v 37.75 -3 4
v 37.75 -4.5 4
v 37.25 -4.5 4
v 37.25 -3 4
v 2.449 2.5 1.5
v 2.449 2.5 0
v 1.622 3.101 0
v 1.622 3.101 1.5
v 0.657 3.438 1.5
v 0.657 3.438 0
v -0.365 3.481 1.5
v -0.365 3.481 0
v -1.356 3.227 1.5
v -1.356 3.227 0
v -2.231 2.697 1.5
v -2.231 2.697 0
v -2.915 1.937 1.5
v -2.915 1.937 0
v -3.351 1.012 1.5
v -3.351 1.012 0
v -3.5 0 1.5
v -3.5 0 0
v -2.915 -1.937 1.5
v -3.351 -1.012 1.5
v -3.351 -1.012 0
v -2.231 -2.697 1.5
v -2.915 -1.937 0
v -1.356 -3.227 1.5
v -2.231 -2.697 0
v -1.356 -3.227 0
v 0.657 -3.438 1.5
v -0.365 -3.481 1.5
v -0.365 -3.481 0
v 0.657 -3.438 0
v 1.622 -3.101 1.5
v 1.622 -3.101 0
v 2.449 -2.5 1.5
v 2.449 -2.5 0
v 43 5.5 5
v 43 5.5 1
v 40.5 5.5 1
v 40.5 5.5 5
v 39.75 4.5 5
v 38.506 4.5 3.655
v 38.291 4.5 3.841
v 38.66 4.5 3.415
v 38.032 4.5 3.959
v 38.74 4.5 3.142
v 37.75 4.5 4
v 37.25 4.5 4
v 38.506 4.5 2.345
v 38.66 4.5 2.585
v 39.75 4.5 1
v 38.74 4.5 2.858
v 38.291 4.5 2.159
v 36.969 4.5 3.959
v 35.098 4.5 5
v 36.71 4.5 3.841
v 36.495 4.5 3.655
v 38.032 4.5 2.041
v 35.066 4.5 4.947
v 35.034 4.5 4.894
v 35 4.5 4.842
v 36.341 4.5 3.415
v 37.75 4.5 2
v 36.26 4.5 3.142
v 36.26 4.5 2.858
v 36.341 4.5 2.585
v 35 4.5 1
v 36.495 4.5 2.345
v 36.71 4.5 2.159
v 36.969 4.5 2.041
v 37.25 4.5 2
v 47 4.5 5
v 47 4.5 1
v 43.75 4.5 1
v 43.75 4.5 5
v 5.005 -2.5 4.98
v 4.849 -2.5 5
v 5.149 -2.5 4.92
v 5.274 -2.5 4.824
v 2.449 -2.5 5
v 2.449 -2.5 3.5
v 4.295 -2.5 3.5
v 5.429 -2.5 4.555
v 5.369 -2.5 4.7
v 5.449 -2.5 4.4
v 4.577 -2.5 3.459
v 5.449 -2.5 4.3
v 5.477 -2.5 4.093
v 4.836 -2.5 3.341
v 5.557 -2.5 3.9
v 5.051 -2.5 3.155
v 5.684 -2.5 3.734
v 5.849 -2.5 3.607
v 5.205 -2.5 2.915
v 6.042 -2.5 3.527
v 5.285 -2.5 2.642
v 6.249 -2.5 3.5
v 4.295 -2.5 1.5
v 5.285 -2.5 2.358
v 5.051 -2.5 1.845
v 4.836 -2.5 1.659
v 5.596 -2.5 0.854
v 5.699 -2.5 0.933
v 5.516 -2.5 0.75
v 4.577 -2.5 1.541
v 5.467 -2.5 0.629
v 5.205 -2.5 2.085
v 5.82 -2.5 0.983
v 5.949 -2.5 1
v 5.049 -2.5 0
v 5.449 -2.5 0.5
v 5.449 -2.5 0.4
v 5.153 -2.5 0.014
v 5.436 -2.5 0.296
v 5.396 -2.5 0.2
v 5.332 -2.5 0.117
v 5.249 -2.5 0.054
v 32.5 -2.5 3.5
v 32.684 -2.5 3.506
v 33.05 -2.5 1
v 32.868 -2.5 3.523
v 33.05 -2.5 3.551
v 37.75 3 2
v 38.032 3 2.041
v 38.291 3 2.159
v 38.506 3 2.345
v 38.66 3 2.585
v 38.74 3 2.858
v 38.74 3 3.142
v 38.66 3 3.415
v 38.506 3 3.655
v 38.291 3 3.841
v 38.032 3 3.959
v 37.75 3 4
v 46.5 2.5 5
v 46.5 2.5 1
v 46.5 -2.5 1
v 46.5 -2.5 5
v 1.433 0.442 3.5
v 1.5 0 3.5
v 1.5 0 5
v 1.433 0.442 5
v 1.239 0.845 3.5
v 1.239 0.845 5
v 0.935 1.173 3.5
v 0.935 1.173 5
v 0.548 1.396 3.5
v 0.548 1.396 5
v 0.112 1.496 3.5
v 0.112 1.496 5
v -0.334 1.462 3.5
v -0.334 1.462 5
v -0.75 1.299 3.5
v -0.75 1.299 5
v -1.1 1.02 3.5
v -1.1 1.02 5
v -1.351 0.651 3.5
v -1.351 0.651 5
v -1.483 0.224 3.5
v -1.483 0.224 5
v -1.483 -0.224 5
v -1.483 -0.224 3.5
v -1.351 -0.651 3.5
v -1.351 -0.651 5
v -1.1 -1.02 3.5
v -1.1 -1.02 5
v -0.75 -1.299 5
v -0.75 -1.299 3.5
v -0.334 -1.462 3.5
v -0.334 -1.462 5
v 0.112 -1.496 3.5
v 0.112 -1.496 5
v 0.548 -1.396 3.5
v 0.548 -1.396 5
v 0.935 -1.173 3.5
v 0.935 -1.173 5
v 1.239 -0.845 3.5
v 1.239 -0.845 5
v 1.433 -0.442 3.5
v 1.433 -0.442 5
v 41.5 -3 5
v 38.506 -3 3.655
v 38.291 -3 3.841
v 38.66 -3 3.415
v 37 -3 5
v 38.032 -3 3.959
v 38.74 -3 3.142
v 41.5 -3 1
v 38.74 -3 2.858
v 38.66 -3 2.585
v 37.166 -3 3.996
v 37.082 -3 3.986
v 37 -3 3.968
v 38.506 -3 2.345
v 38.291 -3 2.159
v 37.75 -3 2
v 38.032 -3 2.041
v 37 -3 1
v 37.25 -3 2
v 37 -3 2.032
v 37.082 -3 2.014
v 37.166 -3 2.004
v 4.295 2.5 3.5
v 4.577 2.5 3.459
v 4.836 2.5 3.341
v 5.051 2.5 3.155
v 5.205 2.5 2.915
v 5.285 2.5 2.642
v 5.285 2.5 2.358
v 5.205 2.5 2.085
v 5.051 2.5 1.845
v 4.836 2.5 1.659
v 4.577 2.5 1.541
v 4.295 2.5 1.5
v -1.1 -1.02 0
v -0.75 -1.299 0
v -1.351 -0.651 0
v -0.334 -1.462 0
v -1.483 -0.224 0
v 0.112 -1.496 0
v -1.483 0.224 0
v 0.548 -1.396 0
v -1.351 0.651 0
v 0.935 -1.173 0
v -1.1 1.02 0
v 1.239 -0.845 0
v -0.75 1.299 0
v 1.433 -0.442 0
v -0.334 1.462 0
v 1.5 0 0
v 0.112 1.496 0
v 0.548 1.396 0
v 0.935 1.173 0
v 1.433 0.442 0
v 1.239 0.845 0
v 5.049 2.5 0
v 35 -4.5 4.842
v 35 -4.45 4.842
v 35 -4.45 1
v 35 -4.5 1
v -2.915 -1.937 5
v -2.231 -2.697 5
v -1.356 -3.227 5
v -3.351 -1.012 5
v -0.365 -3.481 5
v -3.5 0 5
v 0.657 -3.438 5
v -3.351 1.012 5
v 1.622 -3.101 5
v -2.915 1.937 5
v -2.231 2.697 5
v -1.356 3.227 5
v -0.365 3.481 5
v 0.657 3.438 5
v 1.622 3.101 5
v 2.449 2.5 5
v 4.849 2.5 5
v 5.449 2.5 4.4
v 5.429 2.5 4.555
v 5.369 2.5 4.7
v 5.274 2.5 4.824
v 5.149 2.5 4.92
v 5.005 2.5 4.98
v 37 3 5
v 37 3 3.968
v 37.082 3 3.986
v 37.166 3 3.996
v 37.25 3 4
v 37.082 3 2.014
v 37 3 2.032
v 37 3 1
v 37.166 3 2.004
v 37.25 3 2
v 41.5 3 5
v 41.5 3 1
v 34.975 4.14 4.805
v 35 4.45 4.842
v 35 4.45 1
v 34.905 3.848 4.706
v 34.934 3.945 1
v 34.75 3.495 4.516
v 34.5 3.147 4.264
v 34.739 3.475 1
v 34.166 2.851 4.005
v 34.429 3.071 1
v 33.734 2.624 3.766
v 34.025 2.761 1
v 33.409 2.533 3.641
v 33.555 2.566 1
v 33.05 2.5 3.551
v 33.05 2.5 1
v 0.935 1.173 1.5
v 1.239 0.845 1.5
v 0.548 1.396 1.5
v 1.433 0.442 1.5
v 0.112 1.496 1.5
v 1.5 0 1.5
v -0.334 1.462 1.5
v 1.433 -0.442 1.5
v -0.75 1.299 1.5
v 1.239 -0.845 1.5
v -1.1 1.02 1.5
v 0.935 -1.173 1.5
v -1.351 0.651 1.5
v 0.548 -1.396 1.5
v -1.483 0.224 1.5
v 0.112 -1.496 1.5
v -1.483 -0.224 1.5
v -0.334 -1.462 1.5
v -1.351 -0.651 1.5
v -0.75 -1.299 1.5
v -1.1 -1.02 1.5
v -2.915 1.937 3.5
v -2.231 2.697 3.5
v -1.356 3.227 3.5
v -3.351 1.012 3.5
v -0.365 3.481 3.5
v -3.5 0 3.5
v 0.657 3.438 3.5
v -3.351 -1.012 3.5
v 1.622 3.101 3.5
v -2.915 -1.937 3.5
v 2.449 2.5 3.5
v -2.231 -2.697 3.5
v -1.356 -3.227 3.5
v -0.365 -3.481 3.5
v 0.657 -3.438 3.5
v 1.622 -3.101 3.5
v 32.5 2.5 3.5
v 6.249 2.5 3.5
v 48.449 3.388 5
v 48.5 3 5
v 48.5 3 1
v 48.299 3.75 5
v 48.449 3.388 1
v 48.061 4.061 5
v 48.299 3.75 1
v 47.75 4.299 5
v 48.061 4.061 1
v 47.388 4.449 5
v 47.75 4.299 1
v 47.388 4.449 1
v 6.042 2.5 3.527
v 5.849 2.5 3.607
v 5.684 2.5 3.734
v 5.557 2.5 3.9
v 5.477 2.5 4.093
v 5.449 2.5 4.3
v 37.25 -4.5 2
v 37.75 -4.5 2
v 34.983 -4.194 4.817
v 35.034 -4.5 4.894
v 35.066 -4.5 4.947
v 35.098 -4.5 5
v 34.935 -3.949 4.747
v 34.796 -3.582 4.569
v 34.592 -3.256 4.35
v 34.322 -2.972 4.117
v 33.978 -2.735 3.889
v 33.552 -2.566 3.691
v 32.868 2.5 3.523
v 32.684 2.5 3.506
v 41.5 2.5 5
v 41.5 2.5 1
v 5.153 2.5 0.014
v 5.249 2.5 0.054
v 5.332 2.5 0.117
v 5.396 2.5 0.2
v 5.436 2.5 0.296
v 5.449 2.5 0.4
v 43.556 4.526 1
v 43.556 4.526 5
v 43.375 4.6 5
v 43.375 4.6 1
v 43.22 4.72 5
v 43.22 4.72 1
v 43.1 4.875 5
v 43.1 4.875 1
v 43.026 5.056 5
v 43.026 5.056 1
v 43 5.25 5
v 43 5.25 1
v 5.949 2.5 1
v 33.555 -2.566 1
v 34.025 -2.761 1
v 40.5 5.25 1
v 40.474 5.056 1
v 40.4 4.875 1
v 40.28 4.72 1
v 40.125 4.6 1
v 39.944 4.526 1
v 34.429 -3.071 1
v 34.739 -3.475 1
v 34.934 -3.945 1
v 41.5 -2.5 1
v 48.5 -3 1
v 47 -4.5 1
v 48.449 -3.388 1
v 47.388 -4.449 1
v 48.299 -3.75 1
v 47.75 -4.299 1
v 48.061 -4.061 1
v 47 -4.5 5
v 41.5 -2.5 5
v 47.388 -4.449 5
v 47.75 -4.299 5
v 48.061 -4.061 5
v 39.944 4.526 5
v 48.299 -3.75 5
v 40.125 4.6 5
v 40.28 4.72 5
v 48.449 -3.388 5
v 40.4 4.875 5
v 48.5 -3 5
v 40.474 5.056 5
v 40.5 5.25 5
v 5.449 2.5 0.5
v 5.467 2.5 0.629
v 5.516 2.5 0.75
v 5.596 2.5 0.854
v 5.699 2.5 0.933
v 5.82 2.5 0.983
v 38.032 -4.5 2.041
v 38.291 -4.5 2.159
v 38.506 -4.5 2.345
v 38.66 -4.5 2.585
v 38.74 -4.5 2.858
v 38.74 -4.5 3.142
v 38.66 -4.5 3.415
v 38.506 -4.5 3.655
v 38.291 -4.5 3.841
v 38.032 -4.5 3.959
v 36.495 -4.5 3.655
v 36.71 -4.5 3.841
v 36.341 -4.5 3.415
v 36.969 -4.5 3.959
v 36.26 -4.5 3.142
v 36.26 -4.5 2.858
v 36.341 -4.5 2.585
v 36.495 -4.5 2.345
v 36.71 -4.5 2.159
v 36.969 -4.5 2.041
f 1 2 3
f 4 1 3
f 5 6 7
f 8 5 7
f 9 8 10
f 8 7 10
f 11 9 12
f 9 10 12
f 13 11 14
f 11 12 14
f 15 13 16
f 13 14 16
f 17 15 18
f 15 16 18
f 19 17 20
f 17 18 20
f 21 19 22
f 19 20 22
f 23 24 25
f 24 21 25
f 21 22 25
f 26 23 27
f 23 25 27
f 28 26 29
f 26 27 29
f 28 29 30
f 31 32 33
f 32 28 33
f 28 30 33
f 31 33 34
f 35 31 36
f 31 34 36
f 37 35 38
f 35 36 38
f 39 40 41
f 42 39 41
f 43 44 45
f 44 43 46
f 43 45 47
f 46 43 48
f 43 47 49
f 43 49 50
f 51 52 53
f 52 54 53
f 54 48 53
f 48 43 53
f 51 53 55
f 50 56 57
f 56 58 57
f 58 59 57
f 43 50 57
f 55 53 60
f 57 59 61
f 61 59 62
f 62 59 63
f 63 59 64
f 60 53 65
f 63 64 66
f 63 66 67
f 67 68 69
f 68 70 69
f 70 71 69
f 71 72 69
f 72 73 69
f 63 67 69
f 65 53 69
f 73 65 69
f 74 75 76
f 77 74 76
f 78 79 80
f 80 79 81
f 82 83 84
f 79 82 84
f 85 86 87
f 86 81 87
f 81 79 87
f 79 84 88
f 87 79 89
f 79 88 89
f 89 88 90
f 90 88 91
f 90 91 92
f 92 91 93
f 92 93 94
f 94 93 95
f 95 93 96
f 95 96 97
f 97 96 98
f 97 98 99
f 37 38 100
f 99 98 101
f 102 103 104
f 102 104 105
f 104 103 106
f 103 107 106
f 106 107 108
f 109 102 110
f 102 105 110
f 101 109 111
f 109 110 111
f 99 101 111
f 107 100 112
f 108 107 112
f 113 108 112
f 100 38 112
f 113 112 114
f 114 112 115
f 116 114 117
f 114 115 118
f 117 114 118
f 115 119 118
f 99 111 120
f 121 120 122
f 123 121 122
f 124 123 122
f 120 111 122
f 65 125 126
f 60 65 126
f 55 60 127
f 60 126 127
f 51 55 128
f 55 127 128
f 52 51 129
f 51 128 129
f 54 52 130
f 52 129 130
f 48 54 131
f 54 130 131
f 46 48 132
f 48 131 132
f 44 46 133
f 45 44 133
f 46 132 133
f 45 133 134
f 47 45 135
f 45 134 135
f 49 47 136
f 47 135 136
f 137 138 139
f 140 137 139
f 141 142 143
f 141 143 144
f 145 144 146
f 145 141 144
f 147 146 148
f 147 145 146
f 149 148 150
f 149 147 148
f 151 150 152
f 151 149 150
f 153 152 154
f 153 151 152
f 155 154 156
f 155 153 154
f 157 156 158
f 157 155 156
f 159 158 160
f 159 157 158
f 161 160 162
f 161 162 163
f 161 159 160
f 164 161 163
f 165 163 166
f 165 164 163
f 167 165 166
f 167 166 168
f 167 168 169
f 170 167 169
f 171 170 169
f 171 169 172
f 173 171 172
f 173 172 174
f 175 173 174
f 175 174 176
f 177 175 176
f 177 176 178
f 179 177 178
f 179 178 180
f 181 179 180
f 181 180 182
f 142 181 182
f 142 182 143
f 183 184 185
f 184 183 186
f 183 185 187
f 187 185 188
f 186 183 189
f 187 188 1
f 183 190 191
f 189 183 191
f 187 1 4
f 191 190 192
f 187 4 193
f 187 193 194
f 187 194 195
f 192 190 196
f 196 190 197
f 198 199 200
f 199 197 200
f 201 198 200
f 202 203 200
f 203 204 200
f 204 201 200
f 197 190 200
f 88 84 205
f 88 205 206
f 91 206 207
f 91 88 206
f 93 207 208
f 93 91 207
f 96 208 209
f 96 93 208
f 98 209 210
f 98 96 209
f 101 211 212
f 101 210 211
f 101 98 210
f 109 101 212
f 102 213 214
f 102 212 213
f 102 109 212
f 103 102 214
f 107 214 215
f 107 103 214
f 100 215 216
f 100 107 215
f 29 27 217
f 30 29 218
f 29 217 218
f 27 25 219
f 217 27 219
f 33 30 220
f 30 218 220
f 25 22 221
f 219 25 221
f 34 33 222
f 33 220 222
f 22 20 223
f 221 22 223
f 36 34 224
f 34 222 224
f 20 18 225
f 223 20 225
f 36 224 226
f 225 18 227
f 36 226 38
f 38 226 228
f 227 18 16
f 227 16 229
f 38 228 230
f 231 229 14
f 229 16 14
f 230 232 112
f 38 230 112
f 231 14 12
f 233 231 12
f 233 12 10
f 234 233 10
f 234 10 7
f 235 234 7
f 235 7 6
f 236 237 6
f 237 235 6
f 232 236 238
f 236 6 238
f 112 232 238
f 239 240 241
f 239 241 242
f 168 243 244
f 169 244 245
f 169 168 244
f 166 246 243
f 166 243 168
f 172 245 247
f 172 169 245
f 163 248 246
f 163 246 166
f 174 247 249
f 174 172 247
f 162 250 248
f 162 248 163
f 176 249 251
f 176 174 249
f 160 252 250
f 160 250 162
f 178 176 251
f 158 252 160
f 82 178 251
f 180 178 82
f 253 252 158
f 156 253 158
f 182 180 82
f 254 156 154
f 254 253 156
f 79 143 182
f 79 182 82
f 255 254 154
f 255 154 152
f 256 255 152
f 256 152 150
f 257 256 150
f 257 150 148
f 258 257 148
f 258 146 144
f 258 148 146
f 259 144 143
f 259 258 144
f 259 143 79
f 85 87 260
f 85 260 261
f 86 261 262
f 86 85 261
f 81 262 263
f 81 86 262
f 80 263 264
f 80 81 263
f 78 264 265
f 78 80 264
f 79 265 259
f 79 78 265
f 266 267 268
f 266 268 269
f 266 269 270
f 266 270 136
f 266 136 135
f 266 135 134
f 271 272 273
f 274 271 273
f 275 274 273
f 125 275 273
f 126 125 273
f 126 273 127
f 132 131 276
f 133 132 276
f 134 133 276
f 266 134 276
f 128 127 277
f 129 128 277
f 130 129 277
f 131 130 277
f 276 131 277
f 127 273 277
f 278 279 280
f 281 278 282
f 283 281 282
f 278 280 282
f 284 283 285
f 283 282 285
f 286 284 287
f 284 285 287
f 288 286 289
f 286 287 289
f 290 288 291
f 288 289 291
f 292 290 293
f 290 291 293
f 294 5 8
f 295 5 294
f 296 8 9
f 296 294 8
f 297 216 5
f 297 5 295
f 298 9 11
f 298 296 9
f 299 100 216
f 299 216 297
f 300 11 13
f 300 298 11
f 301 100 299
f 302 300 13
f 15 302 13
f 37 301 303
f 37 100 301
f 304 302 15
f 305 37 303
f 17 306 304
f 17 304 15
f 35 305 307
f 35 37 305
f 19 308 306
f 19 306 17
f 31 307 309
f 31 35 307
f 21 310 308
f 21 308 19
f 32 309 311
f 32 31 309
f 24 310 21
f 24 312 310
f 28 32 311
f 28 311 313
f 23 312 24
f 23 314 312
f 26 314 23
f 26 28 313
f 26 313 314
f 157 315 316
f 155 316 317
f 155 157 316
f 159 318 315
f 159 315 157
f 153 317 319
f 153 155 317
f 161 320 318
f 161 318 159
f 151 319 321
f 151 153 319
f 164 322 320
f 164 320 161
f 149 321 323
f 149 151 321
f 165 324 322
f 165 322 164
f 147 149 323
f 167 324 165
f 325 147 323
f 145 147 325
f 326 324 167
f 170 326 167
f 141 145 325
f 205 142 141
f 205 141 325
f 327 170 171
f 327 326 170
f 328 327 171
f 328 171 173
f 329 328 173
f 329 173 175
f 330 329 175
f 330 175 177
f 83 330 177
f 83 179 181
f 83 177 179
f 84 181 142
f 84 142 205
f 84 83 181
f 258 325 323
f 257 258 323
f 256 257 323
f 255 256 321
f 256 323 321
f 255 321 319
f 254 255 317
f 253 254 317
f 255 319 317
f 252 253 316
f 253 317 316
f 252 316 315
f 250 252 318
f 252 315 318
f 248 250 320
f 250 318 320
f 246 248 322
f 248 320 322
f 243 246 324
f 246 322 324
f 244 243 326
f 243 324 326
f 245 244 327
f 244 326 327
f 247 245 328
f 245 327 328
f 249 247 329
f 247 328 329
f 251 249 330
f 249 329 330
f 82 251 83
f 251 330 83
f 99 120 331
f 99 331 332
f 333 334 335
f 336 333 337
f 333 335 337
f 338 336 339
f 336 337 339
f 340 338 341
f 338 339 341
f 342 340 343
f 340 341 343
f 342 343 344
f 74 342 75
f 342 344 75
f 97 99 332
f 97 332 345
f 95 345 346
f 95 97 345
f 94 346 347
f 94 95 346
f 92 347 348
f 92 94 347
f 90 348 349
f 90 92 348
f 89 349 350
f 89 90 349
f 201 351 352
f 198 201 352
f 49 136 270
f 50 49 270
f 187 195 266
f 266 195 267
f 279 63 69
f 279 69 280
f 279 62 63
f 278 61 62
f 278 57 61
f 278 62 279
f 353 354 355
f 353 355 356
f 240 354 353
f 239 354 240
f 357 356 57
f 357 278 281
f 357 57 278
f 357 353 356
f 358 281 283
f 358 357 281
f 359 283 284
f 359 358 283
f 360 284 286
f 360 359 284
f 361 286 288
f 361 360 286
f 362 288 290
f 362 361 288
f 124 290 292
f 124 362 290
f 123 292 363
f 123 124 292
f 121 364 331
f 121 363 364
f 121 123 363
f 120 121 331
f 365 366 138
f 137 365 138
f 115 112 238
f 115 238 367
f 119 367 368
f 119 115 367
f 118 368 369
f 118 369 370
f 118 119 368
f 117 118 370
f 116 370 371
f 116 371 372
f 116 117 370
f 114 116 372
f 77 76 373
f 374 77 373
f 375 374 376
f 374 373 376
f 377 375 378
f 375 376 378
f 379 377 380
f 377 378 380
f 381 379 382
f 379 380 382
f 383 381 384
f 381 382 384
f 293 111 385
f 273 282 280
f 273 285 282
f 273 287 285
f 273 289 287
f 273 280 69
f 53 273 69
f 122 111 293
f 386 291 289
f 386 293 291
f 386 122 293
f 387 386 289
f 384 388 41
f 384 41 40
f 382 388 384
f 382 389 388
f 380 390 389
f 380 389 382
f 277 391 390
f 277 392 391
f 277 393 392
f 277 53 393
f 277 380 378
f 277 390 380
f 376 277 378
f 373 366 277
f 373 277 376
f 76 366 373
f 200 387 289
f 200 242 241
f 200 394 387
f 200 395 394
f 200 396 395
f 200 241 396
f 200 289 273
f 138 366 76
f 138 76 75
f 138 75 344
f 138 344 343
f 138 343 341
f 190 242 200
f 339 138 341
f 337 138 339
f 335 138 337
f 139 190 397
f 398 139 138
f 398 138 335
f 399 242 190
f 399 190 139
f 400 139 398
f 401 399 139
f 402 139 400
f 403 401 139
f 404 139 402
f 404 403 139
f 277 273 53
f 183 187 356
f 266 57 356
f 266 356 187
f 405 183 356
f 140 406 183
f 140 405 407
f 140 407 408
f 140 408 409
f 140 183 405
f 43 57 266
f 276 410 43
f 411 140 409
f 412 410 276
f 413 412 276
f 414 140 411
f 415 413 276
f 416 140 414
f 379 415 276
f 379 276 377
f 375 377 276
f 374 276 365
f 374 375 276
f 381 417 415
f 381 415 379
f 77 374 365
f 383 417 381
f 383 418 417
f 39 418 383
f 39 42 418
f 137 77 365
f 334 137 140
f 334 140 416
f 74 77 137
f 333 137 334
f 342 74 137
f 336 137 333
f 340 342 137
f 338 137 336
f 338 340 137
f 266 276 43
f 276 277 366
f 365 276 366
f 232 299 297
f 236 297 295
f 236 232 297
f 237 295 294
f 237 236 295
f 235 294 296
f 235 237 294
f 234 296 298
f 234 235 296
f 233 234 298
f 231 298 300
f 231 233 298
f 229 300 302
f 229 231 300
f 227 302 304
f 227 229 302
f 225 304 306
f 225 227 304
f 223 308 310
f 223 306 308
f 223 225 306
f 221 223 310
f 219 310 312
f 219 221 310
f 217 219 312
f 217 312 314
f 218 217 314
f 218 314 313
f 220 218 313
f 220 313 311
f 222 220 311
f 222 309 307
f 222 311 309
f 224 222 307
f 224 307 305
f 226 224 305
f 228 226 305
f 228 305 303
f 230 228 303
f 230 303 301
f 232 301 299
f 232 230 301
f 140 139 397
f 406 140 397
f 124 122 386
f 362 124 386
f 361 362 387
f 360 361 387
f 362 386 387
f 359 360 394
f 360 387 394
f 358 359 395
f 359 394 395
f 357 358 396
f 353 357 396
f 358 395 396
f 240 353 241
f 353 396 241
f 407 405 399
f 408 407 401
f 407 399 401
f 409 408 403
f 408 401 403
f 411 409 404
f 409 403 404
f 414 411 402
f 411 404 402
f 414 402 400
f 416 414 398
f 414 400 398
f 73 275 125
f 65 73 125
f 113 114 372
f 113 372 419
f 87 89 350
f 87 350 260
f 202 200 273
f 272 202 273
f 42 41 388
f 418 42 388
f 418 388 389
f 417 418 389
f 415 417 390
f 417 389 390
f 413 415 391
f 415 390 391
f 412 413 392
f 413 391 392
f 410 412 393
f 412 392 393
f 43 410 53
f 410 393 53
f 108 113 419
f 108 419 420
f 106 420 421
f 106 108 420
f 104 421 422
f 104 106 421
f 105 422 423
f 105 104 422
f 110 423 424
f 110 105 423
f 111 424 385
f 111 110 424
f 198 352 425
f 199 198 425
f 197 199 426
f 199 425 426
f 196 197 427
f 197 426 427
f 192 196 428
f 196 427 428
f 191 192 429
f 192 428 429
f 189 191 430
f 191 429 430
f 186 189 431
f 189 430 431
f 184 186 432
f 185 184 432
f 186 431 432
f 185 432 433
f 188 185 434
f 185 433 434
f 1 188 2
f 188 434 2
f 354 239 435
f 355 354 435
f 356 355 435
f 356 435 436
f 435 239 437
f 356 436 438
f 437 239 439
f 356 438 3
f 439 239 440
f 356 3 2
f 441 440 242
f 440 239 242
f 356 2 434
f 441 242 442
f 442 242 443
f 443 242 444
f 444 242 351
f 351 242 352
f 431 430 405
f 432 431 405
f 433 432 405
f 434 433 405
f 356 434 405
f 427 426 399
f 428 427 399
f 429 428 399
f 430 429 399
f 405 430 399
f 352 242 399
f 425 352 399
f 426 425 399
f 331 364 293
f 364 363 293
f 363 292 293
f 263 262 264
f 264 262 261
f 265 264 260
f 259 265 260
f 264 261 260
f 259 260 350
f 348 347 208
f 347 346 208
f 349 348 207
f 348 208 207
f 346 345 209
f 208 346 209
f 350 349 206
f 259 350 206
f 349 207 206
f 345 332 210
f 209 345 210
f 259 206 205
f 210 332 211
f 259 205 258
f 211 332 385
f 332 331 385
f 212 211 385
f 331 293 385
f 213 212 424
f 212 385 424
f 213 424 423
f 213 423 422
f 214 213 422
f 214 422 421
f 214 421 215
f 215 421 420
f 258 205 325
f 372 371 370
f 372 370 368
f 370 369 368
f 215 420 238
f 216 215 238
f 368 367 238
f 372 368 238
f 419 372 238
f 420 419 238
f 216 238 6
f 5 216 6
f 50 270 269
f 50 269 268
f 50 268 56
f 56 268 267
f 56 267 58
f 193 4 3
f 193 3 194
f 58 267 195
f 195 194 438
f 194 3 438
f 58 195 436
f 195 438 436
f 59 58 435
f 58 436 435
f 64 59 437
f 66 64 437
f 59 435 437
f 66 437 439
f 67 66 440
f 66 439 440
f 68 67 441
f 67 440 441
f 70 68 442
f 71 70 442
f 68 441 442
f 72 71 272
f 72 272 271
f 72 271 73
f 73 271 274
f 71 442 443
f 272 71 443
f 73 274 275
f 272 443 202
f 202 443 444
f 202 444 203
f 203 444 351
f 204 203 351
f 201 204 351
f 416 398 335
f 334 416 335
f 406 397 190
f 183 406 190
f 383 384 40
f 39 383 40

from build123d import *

# Parameters (mm, degrees)
ESQUISSE1_R                  = 3.5
ESQUISSE1_R_2                = 1.5
BOSS_EXTRU_1_DEPTH           = 5
ENL_V_MAT_EXTRU_2_DEPTH      = 50.256979201
ENL_V_MAT_EXTRU_2_DEPTH_BACK = 50.256979201
ENL_V_MAT_EXTRU_3_DEPTH      = 50.580742257
ENL_V_MAT_EXTRU_3_DEPTH_BACK = 50.580742257


with BuildPart() as part:
    # Esquisse1 → Boss.-Extru.1 (new body)
    # profile 1 of 2: a face of its own
    with BuildSketch(Plane.XY):
        Circle(ESQUISSE1_R)
        Circle(ESQUISSE1_R_2, mode=Mode.SUBTRACT)
    # profile 2 of 2: a face of its own
    with BuildSketch(Plane.XY):
        with BuildLine():
            Line((33.05, 2.5), (3.5, 2.5))
            Line((3.5, 2.5), (2.449489743, 2.5))
            ThreePointArc((2.449489743, 2.5), (3.226702194, 1.355873501), (3.5, 0))
            ThreePointArc((3.5, 0), (3.226702194, -1.355873501), (2.449489743, -2.5))
            Line((2.449489743, -2.5), (3.5, -2.5))
            Line((3.5, -2.5), (33.05, -2.5))
            ThreePointArc((33.05, -2.5), (34.428858223, -3.071141777), (35, -4.45))
            Line((35, -4.45), (35, -4.5))
            Line((35, -4.5), (47, -4.5))
            ThreePointArc((47, -4.5), (48.060660172, -4.060660172), (48.5, -3))
            Line((48.5, -3), (48.5, 3))
            ThreePointArc((48.5, 3), (48.060660172, 4.060660172), (47, 4.5))
            Line((47, 4.5), (43.75, 4.5))
            ThreePointArc((43.75, 4.5), (43.219669914, 4.719669914), (43, 5.25))
            Line((43, 5.25), (43, 5.5))
            Line((43, 5.5), (40.5, 5.5))
            Line((40.5, 5.5), (40.5, 5.25))
            ThreePointArc((40.5, 5.25), (40.280330086, 4.719669914), (39.75, 4.5))
            Line((39.75, 4.5), (35, 4.5))
            Line((35, 4.5), (35, 4.45))
            ThreePointArc((35, 4.45), (34.428858223, 3.071141777), (33.05, 2.5))
        make_face()
        Polygon((41.5, -3), (37, -3), (37, 3), (41.5, 3), (41.5, 2.5), (46.5, 2.5), (46.5, -2.5), (41.5, -2.5), align=None, mode=Mode.SUBTRACT)
    extrude(amount=BOSS_EXTRU_1_DEPTH)

    # Esquisse2 → Enlèv. mat.-Extru.2 (cut, two sides: drawn at the far end of the back side and taken through both)
    with BuildSketch(Plane(origin=(0, 2.5, 0), x_dir=(1, 0, 0), z_dir=(0, 1, 0)).offset(-ENL_V_MAT_EXTRU_2_DEPTH_BACK)):
        with BuildLine():
            ThreePointArc((5.449489743, -0.5), (5.595936352, -0.853553391), (5.949489743, -1))
            Line((5.949489743, -1), (48.5, -1))
            Line((48.5, -1), (48.5, 0))
            Line((48.5, 0), (5.049489743, 0))
            ThreePointArc((5.049489743, 0), (5.332332455, -0.117157288), (5.449489743, -0.4))
            Line((5.449489743, -0.4), (5.449489743, -0.5))
        make_face()
        with BuildLine():
            Line((4.849489662, -5), (35.098076211, -5))
            ThreePointArc((35.098076211, -5), (34, -3.901923789), (32.5, -3.5))
            Line((32.5, -3.5), (6.249489662, -3.5))
            ThreePointArc((6.249489662, -3.5), (5.683804237, -3.734314575), (5.449489662, -4.3))
            Line((5.449489662, -4.3), (5.449489662, -4.4))
            ThreePointArc((5.449489662, -4.4), (5.27375373, -4.824264069), (4.849489662, -5))
        make_face()
        with BuildLine():
            Line((4.295064523, -1.5), (-3.5, -1.5))
            Line((-3.5, -1.5), (-3.5, -3.5))
            Line((-3.5, -3.5), (4.295064523, -3.5))
            ThreePointArc((4.295064523, -3.5), (5.295064523, -2.5), (4.295064523, -1.5))
        make_face()
    extrude(amount=ENL_V_MAT_EXTRU_2_DEPTH + ENL_V_MAT_EXTRU_2_DEPTH_BACK, mode=Mode.SUBTRACT)

    # Esquisse3 → Enlèv. mat.-Extru.3 (cut, two sides: drawn at the far end of the back side and taken through both)
    with BuildSketch(Plane(origin=(0, 4.5, 0), x_dir=(1, 0, 0), z_dir=(0, 1, 0)).offset(-ENL_V_MAT_EXTRU_3_DEPTH_BACK)):
        with BuildLine():
            Line((37.750303976, -4), (37.250303976, -4))
            ThreePointArc((37.250303976, -4), (36.250303976, -3), (37.250303976, -2))
            Line((37.250303976, -2), (37.750303976, -2))
            ThreePointArc((37.750303976, -2), (38.750303976, -3), (37.750303976, -4))
        make_face()
    extrude(amount=ENL_V_MAT_EXTRU_3_DEPTH + ENL_V_MAT_EXTRU_3_DEPTH_BACK, mode=Mode.SUBTRACT)


solid = part.part
